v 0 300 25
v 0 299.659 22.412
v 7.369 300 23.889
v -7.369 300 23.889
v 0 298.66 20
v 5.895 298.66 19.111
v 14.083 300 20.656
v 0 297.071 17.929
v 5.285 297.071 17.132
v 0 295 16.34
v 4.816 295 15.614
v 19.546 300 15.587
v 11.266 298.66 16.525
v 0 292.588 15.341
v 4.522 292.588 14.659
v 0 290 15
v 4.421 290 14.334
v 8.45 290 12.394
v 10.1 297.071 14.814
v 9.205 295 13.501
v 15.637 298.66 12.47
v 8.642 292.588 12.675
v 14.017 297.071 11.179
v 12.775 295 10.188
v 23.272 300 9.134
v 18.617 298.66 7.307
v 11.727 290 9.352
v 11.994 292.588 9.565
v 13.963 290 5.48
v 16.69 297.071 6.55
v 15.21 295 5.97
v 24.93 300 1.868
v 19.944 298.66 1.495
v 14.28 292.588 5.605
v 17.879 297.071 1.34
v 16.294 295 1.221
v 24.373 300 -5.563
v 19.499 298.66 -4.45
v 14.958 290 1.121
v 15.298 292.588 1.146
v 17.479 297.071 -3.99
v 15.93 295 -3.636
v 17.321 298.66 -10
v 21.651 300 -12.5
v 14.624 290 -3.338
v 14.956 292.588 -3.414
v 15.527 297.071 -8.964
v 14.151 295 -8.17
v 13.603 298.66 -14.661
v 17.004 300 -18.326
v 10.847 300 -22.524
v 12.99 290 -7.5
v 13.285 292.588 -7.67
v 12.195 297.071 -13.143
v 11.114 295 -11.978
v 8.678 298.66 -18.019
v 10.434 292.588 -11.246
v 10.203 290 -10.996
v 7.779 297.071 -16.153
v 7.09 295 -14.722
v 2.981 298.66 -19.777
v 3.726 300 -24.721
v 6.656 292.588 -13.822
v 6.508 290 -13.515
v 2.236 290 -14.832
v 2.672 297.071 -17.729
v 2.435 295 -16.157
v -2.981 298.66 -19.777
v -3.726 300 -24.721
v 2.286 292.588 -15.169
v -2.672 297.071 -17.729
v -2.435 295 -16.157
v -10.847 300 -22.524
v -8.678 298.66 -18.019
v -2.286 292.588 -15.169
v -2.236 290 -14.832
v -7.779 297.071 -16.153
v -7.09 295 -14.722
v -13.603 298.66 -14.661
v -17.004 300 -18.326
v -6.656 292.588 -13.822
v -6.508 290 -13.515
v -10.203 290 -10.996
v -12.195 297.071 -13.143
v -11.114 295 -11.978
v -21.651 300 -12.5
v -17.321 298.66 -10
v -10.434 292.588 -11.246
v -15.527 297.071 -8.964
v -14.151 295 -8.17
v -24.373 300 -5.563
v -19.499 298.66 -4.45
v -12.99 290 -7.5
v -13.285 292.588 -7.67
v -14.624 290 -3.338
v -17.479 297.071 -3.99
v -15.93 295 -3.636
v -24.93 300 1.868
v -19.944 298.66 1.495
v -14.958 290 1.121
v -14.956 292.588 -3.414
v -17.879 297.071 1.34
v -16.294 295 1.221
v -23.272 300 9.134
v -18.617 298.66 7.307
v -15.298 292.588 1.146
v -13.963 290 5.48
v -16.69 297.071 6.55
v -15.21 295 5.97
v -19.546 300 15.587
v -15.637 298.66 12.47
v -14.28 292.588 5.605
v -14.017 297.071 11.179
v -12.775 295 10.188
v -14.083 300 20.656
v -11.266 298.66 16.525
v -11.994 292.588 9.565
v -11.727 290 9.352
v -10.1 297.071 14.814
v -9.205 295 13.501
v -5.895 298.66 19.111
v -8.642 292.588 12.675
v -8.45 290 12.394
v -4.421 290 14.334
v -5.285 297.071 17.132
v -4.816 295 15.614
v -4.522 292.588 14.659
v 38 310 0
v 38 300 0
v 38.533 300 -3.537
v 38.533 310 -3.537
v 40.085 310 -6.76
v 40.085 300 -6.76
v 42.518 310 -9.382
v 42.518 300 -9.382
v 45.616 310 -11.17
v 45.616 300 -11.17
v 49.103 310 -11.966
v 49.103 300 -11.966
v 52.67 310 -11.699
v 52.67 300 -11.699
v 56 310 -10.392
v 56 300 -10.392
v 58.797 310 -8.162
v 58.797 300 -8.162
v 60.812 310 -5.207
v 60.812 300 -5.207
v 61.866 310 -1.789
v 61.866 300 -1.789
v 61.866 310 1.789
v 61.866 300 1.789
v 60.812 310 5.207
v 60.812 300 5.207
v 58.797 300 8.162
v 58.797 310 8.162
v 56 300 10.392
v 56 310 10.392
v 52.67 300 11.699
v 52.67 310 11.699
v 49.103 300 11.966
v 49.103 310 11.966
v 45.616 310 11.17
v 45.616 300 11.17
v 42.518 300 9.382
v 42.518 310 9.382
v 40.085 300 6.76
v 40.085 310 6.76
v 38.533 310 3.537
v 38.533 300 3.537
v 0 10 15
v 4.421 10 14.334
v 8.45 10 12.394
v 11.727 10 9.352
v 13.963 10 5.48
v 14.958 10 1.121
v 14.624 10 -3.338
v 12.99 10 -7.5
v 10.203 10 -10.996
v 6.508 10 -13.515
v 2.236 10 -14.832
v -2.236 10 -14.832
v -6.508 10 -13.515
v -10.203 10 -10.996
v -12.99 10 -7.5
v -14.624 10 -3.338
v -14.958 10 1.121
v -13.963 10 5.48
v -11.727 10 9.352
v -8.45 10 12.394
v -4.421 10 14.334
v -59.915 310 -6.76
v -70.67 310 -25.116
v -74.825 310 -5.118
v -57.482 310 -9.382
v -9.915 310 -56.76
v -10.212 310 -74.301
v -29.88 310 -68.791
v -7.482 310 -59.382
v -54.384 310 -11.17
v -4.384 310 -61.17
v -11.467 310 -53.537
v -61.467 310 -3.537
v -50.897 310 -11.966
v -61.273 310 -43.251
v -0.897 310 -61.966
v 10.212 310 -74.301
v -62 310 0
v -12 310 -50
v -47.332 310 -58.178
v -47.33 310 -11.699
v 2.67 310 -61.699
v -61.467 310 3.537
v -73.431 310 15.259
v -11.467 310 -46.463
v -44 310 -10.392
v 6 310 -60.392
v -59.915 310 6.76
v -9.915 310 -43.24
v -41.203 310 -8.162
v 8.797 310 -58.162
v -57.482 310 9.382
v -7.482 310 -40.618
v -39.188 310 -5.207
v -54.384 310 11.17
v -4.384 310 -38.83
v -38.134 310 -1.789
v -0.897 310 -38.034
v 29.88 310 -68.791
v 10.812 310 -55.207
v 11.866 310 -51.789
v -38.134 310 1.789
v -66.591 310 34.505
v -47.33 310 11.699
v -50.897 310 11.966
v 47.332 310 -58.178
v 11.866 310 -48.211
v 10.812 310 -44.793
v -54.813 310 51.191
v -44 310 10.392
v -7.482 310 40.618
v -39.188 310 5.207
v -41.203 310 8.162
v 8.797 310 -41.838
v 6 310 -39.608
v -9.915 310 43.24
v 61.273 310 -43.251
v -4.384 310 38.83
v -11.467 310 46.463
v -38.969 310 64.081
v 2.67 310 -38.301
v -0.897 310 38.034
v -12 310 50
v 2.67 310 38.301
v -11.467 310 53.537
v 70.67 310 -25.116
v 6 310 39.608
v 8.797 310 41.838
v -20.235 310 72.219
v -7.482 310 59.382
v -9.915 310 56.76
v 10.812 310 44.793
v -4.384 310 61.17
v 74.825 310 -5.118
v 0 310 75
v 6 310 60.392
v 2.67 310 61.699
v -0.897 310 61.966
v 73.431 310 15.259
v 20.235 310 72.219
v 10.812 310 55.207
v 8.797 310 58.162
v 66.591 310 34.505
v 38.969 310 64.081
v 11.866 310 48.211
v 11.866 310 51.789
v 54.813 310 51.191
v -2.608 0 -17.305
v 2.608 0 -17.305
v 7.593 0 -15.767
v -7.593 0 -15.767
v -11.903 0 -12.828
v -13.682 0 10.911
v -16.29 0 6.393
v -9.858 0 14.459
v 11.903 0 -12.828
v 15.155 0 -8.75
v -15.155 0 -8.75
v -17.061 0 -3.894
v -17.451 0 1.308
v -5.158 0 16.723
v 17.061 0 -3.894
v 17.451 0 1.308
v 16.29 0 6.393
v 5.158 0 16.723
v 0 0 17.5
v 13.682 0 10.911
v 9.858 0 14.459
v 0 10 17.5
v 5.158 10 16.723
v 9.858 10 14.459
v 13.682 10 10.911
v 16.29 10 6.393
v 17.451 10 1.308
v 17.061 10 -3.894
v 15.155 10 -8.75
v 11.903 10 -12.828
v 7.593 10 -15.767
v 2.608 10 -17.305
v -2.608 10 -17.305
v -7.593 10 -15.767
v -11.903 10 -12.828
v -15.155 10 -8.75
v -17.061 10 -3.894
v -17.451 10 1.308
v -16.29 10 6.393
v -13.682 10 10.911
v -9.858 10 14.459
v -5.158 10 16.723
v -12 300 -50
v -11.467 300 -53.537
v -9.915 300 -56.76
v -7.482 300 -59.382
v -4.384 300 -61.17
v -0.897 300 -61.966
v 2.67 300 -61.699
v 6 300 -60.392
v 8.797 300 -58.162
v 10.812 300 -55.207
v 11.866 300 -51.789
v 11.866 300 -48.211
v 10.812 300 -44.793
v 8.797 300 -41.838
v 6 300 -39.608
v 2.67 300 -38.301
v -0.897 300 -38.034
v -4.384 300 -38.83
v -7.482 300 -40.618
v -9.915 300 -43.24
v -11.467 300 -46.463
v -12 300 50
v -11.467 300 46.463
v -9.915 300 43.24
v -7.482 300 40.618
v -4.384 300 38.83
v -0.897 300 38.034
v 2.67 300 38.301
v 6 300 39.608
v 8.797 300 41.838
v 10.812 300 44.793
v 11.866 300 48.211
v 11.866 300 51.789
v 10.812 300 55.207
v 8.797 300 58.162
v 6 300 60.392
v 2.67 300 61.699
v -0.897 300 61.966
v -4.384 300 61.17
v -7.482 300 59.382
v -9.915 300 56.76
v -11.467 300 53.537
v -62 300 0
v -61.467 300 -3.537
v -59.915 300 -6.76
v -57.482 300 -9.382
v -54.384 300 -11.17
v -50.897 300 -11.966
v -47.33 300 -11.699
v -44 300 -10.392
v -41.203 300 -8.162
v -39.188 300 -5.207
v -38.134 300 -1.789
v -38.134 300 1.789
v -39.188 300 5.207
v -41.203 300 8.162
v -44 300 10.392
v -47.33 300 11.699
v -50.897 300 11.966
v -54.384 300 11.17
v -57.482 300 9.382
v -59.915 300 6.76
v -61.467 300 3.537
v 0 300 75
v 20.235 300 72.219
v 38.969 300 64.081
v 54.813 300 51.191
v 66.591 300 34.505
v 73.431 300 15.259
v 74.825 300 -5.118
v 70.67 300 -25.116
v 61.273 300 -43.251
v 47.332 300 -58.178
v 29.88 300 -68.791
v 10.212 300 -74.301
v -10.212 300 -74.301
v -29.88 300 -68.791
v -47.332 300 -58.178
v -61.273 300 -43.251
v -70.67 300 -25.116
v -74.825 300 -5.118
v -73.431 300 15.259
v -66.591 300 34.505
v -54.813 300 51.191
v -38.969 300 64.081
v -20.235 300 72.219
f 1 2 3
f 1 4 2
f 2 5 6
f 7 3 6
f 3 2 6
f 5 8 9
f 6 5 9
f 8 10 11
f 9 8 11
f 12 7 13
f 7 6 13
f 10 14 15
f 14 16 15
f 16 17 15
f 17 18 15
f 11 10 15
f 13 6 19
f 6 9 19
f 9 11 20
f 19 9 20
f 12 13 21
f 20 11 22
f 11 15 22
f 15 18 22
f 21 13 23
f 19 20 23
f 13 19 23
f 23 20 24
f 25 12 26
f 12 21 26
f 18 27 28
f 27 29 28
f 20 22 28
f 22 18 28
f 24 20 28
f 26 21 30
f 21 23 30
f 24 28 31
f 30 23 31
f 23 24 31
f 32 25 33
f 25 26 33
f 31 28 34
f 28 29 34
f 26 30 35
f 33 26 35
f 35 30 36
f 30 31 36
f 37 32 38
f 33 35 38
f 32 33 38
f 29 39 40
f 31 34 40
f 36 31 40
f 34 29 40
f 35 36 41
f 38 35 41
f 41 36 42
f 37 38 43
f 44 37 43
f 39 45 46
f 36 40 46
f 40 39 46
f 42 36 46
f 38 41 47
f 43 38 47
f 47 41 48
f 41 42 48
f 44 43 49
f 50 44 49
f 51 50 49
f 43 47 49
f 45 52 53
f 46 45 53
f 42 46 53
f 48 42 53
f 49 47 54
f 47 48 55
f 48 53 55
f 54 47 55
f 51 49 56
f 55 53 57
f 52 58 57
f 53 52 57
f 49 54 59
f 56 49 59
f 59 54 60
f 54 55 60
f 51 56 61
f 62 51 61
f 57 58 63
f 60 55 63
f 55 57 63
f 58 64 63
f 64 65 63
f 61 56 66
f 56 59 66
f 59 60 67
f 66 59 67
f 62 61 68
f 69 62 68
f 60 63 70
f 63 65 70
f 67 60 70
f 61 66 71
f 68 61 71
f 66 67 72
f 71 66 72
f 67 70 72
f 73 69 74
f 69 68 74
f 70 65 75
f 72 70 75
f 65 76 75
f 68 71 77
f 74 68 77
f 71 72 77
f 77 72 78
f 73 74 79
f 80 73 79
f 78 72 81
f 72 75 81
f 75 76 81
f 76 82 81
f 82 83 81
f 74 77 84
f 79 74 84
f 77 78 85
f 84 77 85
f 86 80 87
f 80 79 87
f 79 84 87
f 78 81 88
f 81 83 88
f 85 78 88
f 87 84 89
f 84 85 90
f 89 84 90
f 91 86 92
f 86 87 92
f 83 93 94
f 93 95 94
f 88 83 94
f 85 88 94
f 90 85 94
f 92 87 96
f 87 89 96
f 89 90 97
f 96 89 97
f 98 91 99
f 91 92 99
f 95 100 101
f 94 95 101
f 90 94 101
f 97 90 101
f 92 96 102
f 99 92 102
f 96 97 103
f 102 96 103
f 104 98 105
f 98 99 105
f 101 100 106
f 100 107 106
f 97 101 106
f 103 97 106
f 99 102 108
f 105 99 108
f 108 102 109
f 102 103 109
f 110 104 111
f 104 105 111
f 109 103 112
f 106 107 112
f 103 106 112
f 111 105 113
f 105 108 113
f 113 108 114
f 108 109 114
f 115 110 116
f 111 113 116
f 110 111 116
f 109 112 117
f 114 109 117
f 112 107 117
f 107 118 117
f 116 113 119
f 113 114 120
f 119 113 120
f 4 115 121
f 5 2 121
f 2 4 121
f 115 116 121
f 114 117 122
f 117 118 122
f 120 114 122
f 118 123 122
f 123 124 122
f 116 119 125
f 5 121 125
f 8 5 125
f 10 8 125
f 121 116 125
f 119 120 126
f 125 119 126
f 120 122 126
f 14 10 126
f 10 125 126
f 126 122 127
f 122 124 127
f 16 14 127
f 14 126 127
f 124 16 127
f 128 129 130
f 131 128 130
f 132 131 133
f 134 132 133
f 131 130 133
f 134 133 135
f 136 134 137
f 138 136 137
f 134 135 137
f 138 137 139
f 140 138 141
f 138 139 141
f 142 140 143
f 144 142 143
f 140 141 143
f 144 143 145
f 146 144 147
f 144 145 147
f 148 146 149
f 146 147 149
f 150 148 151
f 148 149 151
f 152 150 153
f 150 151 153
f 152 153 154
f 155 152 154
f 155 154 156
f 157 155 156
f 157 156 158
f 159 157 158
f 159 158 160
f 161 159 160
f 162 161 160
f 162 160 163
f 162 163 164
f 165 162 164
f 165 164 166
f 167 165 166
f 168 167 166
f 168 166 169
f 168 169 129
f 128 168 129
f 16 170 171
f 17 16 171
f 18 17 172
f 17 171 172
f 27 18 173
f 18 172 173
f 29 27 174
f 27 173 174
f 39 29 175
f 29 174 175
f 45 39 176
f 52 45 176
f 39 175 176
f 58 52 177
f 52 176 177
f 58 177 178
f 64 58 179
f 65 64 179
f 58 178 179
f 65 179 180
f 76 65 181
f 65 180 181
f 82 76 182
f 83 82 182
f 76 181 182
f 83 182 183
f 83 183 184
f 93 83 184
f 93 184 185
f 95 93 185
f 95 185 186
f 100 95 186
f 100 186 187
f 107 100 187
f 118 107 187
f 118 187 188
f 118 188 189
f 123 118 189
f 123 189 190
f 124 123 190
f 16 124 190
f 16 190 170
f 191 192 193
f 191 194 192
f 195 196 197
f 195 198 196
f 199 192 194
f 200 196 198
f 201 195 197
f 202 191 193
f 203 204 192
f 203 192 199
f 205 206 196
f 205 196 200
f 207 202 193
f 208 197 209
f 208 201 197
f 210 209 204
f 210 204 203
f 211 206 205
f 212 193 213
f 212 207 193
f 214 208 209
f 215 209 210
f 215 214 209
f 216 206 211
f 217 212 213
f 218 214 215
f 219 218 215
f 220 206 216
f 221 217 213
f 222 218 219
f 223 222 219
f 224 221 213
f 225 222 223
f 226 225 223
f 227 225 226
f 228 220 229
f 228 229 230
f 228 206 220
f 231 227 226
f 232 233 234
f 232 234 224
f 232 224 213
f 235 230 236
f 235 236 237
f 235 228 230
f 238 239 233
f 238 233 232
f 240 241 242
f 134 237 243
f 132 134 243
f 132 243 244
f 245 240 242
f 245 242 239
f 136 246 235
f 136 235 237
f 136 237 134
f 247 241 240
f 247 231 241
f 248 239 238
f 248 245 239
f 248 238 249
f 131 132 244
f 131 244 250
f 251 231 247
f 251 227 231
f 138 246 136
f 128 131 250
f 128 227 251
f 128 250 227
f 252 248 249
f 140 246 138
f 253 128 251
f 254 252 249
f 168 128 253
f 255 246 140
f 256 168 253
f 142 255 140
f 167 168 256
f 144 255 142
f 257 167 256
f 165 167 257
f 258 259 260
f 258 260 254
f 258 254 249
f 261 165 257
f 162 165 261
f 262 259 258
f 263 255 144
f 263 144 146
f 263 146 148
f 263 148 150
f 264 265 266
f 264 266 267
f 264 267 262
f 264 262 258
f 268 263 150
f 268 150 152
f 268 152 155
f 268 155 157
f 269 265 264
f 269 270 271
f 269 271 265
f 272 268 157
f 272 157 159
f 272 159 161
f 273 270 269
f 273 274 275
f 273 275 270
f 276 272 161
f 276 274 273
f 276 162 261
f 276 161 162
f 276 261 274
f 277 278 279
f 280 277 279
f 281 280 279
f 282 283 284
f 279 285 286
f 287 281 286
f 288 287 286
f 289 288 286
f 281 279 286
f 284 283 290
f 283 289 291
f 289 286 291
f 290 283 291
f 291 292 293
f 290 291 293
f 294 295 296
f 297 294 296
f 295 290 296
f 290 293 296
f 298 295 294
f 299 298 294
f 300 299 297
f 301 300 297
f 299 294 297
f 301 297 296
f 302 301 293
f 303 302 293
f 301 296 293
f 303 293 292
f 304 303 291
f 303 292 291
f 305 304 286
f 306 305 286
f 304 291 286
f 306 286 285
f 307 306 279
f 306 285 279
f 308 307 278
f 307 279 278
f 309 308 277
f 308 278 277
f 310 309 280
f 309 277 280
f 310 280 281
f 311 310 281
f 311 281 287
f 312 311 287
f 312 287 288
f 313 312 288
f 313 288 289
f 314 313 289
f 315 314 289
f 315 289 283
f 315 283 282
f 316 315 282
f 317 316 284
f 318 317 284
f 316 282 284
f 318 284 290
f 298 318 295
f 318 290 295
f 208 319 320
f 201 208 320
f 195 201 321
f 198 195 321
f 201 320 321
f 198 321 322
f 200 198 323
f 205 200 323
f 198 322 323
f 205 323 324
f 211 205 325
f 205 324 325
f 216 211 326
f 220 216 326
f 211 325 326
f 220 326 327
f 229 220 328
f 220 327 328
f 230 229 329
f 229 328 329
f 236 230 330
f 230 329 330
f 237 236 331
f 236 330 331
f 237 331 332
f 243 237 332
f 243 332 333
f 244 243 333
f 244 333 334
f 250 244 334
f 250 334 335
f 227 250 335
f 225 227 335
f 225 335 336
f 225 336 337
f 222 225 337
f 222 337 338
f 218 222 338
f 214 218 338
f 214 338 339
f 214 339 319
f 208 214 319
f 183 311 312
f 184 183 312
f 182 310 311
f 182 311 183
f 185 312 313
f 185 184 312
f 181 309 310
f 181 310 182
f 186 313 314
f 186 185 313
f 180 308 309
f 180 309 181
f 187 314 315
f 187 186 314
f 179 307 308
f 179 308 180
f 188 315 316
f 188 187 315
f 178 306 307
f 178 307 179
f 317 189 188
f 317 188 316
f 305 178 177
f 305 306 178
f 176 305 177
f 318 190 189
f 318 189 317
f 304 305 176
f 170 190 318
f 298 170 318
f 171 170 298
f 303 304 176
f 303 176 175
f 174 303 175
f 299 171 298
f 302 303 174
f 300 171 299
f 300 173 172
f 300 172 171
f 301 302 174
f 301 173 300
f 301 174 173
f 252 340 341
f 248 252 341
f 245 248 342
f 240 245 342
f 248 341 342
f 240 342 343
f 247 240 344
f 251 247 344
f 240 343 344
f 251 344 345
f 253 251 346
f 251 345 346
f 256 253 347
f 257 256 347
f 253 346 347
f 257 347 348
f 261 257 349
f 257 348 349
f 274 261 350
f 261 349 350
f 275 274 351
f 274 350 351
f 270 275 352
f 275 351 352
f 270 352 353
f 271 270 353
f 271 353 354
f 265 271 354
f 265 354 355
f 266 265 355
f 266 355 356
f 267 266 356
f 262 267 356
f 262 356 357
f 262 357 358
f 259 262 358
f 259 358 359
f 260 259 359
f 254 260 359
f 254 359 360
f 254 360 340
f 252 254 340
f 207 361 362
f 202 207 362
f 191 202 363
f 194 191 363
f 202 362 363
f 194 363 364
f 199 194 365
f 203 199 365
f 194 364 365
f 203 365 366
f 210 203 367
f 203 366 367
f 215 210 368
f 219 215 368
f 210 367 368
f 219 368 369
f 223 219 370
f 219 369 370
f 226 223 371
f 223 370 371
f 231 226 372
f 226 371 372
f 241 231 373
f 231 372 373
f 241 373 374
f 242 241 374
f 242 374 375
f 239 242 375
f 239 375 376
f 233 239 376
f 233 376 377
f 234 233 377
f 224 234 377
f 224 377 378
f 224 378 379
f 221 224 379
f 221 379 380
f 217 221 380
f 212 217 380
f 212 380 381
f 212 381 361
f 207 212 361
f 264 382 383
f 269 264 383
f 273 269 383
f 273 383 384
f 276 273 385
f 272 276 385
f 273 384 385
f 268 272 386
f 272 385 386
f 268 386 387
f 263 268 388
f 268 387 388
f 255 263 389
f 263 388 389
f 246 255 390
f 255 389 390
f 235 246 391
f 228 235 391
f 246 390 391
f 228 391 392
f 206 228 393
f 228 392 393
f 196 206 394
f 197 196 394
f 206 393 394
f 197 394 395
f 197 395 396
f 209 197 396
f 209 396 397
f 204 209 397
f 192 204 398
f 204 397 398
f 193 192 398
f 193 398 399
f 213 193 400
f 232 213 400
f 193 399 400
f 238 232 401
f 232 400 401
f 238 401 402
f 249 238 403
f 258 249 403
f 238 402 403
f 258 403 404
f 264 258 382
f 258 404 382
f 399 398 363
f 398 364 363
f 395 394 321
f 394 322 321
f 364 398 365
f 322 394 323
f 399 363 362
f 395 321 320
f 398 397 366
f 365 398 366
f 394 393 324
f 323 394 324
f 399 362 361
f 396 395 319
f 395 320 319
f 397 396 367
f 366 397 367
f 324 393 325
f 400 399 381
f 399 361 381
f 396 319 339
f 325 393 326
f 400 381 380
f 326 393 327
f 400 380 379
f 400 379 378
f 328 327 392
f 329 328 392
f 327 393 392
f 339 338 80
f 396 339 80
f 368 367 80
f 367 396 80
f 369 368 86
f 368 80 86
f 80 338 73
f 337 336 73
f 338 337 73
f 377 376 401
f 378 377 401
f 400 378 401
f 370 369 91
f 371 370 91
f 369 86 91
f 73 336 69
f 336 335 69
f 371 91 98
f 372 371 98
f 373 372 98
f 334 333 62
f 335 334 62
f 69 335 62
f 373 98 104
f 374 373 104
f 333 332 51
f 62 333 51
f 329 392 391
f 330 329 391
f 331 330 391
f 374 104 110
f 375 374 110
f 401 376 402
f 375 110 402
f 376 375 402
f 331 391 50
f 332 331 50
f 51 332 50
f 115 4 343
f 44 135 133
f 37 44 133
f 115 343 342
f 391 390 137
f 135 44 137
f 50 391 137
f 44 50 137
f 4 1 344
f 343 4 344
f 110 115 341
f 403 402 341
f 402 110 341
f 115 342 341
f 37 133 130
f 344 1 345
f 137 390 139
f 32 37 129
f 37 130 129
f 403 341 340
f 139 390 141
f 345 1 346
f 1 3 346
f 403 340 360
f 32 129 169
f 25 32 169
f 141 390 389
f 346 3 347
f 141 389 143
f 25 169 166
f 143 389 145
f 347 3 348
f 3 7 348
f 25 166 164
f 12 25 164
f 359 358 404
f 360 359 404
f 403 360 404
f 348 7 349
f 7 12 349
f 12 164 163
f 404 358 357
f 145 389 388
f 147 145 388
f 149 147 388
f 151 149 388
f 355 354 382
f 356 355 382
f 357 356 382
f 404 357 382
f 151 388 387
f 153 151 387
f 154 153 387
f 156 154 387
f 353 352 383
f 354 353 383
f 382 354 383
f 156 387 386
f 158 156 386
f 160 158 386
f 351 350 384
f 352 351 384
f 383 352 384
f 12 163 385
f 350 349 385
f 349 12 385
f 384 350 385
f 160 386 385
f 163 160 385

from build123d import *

# Parameters (mm, degrees)
SKETCH_1_R      = 17.5
EXTRUDE_1_DEPTH = 10
SKETCH_2_R      = 15
EXTRUDE_2_DEPTH = 300
SKETCH_3_R      = 75
EXTRUDE_3_DEPTH = 10
FILLET_1_R      = 10
HOLE_WIZARD_1_D = 24


with BuildPart() as part:
    # 草图1 → 凸台-拉伸1 (new body)
    with BuildSketch(Plane(origin=(0, 0, 0), x_dir=(1, 0, 0), z_dir=(0, 1, 0))):
        with Locations(Location((0, 0, 0), (0, 0, 270))):
            Circle(SKETCH_1_R)
    extrude(amount=EXTRUDE_1_DEPTH)

    # 草图2 → 凸台-拉伸2 (add)
    with BuildSketch(Plane(origin=(0, 0, 0), x_dir=(1, 0, 0), z_dir=(0, 1, 0))):
        with Locations(Location((0, 0, 0), (0, 0, 270))):
            Circle(SKETCH_2_R)
    extrude(amount=EXTRUDE_2_DEPTH)

    # 草图3 → 凸台-拉伸3 (add)
    with BuildSketch(Plane(origin=(0, 300, 0), x_dir=(1, 0, 0), z_dir=(0, 1, 0))):
        with Locations(Location((0, 0, 0), (0, 0, 270))):
            Circle(SKETCH_3_R)
    extrude(amount=EXTRUDE_3_DEPTH)

    # 圆角1
    fillet_1_edges = [part.edges().sort_by_distance(p)[0] for p in [
        (0, 300, -15),
    ]]
    fillet(fillet_1_edges, radius=FILLET_1_R)

    # 孔1 (through all)
    with Locations(Plane(origin=(0, 310, 0), x_dir=(1, 0, 0), z_dir=(0, 1, 0))):
        with Locations((0, 50), (50, 0), (0, -50), (-50, 0)):
            Hole(HOLE_WIZARD_1_D / 2)


solid = part.part
